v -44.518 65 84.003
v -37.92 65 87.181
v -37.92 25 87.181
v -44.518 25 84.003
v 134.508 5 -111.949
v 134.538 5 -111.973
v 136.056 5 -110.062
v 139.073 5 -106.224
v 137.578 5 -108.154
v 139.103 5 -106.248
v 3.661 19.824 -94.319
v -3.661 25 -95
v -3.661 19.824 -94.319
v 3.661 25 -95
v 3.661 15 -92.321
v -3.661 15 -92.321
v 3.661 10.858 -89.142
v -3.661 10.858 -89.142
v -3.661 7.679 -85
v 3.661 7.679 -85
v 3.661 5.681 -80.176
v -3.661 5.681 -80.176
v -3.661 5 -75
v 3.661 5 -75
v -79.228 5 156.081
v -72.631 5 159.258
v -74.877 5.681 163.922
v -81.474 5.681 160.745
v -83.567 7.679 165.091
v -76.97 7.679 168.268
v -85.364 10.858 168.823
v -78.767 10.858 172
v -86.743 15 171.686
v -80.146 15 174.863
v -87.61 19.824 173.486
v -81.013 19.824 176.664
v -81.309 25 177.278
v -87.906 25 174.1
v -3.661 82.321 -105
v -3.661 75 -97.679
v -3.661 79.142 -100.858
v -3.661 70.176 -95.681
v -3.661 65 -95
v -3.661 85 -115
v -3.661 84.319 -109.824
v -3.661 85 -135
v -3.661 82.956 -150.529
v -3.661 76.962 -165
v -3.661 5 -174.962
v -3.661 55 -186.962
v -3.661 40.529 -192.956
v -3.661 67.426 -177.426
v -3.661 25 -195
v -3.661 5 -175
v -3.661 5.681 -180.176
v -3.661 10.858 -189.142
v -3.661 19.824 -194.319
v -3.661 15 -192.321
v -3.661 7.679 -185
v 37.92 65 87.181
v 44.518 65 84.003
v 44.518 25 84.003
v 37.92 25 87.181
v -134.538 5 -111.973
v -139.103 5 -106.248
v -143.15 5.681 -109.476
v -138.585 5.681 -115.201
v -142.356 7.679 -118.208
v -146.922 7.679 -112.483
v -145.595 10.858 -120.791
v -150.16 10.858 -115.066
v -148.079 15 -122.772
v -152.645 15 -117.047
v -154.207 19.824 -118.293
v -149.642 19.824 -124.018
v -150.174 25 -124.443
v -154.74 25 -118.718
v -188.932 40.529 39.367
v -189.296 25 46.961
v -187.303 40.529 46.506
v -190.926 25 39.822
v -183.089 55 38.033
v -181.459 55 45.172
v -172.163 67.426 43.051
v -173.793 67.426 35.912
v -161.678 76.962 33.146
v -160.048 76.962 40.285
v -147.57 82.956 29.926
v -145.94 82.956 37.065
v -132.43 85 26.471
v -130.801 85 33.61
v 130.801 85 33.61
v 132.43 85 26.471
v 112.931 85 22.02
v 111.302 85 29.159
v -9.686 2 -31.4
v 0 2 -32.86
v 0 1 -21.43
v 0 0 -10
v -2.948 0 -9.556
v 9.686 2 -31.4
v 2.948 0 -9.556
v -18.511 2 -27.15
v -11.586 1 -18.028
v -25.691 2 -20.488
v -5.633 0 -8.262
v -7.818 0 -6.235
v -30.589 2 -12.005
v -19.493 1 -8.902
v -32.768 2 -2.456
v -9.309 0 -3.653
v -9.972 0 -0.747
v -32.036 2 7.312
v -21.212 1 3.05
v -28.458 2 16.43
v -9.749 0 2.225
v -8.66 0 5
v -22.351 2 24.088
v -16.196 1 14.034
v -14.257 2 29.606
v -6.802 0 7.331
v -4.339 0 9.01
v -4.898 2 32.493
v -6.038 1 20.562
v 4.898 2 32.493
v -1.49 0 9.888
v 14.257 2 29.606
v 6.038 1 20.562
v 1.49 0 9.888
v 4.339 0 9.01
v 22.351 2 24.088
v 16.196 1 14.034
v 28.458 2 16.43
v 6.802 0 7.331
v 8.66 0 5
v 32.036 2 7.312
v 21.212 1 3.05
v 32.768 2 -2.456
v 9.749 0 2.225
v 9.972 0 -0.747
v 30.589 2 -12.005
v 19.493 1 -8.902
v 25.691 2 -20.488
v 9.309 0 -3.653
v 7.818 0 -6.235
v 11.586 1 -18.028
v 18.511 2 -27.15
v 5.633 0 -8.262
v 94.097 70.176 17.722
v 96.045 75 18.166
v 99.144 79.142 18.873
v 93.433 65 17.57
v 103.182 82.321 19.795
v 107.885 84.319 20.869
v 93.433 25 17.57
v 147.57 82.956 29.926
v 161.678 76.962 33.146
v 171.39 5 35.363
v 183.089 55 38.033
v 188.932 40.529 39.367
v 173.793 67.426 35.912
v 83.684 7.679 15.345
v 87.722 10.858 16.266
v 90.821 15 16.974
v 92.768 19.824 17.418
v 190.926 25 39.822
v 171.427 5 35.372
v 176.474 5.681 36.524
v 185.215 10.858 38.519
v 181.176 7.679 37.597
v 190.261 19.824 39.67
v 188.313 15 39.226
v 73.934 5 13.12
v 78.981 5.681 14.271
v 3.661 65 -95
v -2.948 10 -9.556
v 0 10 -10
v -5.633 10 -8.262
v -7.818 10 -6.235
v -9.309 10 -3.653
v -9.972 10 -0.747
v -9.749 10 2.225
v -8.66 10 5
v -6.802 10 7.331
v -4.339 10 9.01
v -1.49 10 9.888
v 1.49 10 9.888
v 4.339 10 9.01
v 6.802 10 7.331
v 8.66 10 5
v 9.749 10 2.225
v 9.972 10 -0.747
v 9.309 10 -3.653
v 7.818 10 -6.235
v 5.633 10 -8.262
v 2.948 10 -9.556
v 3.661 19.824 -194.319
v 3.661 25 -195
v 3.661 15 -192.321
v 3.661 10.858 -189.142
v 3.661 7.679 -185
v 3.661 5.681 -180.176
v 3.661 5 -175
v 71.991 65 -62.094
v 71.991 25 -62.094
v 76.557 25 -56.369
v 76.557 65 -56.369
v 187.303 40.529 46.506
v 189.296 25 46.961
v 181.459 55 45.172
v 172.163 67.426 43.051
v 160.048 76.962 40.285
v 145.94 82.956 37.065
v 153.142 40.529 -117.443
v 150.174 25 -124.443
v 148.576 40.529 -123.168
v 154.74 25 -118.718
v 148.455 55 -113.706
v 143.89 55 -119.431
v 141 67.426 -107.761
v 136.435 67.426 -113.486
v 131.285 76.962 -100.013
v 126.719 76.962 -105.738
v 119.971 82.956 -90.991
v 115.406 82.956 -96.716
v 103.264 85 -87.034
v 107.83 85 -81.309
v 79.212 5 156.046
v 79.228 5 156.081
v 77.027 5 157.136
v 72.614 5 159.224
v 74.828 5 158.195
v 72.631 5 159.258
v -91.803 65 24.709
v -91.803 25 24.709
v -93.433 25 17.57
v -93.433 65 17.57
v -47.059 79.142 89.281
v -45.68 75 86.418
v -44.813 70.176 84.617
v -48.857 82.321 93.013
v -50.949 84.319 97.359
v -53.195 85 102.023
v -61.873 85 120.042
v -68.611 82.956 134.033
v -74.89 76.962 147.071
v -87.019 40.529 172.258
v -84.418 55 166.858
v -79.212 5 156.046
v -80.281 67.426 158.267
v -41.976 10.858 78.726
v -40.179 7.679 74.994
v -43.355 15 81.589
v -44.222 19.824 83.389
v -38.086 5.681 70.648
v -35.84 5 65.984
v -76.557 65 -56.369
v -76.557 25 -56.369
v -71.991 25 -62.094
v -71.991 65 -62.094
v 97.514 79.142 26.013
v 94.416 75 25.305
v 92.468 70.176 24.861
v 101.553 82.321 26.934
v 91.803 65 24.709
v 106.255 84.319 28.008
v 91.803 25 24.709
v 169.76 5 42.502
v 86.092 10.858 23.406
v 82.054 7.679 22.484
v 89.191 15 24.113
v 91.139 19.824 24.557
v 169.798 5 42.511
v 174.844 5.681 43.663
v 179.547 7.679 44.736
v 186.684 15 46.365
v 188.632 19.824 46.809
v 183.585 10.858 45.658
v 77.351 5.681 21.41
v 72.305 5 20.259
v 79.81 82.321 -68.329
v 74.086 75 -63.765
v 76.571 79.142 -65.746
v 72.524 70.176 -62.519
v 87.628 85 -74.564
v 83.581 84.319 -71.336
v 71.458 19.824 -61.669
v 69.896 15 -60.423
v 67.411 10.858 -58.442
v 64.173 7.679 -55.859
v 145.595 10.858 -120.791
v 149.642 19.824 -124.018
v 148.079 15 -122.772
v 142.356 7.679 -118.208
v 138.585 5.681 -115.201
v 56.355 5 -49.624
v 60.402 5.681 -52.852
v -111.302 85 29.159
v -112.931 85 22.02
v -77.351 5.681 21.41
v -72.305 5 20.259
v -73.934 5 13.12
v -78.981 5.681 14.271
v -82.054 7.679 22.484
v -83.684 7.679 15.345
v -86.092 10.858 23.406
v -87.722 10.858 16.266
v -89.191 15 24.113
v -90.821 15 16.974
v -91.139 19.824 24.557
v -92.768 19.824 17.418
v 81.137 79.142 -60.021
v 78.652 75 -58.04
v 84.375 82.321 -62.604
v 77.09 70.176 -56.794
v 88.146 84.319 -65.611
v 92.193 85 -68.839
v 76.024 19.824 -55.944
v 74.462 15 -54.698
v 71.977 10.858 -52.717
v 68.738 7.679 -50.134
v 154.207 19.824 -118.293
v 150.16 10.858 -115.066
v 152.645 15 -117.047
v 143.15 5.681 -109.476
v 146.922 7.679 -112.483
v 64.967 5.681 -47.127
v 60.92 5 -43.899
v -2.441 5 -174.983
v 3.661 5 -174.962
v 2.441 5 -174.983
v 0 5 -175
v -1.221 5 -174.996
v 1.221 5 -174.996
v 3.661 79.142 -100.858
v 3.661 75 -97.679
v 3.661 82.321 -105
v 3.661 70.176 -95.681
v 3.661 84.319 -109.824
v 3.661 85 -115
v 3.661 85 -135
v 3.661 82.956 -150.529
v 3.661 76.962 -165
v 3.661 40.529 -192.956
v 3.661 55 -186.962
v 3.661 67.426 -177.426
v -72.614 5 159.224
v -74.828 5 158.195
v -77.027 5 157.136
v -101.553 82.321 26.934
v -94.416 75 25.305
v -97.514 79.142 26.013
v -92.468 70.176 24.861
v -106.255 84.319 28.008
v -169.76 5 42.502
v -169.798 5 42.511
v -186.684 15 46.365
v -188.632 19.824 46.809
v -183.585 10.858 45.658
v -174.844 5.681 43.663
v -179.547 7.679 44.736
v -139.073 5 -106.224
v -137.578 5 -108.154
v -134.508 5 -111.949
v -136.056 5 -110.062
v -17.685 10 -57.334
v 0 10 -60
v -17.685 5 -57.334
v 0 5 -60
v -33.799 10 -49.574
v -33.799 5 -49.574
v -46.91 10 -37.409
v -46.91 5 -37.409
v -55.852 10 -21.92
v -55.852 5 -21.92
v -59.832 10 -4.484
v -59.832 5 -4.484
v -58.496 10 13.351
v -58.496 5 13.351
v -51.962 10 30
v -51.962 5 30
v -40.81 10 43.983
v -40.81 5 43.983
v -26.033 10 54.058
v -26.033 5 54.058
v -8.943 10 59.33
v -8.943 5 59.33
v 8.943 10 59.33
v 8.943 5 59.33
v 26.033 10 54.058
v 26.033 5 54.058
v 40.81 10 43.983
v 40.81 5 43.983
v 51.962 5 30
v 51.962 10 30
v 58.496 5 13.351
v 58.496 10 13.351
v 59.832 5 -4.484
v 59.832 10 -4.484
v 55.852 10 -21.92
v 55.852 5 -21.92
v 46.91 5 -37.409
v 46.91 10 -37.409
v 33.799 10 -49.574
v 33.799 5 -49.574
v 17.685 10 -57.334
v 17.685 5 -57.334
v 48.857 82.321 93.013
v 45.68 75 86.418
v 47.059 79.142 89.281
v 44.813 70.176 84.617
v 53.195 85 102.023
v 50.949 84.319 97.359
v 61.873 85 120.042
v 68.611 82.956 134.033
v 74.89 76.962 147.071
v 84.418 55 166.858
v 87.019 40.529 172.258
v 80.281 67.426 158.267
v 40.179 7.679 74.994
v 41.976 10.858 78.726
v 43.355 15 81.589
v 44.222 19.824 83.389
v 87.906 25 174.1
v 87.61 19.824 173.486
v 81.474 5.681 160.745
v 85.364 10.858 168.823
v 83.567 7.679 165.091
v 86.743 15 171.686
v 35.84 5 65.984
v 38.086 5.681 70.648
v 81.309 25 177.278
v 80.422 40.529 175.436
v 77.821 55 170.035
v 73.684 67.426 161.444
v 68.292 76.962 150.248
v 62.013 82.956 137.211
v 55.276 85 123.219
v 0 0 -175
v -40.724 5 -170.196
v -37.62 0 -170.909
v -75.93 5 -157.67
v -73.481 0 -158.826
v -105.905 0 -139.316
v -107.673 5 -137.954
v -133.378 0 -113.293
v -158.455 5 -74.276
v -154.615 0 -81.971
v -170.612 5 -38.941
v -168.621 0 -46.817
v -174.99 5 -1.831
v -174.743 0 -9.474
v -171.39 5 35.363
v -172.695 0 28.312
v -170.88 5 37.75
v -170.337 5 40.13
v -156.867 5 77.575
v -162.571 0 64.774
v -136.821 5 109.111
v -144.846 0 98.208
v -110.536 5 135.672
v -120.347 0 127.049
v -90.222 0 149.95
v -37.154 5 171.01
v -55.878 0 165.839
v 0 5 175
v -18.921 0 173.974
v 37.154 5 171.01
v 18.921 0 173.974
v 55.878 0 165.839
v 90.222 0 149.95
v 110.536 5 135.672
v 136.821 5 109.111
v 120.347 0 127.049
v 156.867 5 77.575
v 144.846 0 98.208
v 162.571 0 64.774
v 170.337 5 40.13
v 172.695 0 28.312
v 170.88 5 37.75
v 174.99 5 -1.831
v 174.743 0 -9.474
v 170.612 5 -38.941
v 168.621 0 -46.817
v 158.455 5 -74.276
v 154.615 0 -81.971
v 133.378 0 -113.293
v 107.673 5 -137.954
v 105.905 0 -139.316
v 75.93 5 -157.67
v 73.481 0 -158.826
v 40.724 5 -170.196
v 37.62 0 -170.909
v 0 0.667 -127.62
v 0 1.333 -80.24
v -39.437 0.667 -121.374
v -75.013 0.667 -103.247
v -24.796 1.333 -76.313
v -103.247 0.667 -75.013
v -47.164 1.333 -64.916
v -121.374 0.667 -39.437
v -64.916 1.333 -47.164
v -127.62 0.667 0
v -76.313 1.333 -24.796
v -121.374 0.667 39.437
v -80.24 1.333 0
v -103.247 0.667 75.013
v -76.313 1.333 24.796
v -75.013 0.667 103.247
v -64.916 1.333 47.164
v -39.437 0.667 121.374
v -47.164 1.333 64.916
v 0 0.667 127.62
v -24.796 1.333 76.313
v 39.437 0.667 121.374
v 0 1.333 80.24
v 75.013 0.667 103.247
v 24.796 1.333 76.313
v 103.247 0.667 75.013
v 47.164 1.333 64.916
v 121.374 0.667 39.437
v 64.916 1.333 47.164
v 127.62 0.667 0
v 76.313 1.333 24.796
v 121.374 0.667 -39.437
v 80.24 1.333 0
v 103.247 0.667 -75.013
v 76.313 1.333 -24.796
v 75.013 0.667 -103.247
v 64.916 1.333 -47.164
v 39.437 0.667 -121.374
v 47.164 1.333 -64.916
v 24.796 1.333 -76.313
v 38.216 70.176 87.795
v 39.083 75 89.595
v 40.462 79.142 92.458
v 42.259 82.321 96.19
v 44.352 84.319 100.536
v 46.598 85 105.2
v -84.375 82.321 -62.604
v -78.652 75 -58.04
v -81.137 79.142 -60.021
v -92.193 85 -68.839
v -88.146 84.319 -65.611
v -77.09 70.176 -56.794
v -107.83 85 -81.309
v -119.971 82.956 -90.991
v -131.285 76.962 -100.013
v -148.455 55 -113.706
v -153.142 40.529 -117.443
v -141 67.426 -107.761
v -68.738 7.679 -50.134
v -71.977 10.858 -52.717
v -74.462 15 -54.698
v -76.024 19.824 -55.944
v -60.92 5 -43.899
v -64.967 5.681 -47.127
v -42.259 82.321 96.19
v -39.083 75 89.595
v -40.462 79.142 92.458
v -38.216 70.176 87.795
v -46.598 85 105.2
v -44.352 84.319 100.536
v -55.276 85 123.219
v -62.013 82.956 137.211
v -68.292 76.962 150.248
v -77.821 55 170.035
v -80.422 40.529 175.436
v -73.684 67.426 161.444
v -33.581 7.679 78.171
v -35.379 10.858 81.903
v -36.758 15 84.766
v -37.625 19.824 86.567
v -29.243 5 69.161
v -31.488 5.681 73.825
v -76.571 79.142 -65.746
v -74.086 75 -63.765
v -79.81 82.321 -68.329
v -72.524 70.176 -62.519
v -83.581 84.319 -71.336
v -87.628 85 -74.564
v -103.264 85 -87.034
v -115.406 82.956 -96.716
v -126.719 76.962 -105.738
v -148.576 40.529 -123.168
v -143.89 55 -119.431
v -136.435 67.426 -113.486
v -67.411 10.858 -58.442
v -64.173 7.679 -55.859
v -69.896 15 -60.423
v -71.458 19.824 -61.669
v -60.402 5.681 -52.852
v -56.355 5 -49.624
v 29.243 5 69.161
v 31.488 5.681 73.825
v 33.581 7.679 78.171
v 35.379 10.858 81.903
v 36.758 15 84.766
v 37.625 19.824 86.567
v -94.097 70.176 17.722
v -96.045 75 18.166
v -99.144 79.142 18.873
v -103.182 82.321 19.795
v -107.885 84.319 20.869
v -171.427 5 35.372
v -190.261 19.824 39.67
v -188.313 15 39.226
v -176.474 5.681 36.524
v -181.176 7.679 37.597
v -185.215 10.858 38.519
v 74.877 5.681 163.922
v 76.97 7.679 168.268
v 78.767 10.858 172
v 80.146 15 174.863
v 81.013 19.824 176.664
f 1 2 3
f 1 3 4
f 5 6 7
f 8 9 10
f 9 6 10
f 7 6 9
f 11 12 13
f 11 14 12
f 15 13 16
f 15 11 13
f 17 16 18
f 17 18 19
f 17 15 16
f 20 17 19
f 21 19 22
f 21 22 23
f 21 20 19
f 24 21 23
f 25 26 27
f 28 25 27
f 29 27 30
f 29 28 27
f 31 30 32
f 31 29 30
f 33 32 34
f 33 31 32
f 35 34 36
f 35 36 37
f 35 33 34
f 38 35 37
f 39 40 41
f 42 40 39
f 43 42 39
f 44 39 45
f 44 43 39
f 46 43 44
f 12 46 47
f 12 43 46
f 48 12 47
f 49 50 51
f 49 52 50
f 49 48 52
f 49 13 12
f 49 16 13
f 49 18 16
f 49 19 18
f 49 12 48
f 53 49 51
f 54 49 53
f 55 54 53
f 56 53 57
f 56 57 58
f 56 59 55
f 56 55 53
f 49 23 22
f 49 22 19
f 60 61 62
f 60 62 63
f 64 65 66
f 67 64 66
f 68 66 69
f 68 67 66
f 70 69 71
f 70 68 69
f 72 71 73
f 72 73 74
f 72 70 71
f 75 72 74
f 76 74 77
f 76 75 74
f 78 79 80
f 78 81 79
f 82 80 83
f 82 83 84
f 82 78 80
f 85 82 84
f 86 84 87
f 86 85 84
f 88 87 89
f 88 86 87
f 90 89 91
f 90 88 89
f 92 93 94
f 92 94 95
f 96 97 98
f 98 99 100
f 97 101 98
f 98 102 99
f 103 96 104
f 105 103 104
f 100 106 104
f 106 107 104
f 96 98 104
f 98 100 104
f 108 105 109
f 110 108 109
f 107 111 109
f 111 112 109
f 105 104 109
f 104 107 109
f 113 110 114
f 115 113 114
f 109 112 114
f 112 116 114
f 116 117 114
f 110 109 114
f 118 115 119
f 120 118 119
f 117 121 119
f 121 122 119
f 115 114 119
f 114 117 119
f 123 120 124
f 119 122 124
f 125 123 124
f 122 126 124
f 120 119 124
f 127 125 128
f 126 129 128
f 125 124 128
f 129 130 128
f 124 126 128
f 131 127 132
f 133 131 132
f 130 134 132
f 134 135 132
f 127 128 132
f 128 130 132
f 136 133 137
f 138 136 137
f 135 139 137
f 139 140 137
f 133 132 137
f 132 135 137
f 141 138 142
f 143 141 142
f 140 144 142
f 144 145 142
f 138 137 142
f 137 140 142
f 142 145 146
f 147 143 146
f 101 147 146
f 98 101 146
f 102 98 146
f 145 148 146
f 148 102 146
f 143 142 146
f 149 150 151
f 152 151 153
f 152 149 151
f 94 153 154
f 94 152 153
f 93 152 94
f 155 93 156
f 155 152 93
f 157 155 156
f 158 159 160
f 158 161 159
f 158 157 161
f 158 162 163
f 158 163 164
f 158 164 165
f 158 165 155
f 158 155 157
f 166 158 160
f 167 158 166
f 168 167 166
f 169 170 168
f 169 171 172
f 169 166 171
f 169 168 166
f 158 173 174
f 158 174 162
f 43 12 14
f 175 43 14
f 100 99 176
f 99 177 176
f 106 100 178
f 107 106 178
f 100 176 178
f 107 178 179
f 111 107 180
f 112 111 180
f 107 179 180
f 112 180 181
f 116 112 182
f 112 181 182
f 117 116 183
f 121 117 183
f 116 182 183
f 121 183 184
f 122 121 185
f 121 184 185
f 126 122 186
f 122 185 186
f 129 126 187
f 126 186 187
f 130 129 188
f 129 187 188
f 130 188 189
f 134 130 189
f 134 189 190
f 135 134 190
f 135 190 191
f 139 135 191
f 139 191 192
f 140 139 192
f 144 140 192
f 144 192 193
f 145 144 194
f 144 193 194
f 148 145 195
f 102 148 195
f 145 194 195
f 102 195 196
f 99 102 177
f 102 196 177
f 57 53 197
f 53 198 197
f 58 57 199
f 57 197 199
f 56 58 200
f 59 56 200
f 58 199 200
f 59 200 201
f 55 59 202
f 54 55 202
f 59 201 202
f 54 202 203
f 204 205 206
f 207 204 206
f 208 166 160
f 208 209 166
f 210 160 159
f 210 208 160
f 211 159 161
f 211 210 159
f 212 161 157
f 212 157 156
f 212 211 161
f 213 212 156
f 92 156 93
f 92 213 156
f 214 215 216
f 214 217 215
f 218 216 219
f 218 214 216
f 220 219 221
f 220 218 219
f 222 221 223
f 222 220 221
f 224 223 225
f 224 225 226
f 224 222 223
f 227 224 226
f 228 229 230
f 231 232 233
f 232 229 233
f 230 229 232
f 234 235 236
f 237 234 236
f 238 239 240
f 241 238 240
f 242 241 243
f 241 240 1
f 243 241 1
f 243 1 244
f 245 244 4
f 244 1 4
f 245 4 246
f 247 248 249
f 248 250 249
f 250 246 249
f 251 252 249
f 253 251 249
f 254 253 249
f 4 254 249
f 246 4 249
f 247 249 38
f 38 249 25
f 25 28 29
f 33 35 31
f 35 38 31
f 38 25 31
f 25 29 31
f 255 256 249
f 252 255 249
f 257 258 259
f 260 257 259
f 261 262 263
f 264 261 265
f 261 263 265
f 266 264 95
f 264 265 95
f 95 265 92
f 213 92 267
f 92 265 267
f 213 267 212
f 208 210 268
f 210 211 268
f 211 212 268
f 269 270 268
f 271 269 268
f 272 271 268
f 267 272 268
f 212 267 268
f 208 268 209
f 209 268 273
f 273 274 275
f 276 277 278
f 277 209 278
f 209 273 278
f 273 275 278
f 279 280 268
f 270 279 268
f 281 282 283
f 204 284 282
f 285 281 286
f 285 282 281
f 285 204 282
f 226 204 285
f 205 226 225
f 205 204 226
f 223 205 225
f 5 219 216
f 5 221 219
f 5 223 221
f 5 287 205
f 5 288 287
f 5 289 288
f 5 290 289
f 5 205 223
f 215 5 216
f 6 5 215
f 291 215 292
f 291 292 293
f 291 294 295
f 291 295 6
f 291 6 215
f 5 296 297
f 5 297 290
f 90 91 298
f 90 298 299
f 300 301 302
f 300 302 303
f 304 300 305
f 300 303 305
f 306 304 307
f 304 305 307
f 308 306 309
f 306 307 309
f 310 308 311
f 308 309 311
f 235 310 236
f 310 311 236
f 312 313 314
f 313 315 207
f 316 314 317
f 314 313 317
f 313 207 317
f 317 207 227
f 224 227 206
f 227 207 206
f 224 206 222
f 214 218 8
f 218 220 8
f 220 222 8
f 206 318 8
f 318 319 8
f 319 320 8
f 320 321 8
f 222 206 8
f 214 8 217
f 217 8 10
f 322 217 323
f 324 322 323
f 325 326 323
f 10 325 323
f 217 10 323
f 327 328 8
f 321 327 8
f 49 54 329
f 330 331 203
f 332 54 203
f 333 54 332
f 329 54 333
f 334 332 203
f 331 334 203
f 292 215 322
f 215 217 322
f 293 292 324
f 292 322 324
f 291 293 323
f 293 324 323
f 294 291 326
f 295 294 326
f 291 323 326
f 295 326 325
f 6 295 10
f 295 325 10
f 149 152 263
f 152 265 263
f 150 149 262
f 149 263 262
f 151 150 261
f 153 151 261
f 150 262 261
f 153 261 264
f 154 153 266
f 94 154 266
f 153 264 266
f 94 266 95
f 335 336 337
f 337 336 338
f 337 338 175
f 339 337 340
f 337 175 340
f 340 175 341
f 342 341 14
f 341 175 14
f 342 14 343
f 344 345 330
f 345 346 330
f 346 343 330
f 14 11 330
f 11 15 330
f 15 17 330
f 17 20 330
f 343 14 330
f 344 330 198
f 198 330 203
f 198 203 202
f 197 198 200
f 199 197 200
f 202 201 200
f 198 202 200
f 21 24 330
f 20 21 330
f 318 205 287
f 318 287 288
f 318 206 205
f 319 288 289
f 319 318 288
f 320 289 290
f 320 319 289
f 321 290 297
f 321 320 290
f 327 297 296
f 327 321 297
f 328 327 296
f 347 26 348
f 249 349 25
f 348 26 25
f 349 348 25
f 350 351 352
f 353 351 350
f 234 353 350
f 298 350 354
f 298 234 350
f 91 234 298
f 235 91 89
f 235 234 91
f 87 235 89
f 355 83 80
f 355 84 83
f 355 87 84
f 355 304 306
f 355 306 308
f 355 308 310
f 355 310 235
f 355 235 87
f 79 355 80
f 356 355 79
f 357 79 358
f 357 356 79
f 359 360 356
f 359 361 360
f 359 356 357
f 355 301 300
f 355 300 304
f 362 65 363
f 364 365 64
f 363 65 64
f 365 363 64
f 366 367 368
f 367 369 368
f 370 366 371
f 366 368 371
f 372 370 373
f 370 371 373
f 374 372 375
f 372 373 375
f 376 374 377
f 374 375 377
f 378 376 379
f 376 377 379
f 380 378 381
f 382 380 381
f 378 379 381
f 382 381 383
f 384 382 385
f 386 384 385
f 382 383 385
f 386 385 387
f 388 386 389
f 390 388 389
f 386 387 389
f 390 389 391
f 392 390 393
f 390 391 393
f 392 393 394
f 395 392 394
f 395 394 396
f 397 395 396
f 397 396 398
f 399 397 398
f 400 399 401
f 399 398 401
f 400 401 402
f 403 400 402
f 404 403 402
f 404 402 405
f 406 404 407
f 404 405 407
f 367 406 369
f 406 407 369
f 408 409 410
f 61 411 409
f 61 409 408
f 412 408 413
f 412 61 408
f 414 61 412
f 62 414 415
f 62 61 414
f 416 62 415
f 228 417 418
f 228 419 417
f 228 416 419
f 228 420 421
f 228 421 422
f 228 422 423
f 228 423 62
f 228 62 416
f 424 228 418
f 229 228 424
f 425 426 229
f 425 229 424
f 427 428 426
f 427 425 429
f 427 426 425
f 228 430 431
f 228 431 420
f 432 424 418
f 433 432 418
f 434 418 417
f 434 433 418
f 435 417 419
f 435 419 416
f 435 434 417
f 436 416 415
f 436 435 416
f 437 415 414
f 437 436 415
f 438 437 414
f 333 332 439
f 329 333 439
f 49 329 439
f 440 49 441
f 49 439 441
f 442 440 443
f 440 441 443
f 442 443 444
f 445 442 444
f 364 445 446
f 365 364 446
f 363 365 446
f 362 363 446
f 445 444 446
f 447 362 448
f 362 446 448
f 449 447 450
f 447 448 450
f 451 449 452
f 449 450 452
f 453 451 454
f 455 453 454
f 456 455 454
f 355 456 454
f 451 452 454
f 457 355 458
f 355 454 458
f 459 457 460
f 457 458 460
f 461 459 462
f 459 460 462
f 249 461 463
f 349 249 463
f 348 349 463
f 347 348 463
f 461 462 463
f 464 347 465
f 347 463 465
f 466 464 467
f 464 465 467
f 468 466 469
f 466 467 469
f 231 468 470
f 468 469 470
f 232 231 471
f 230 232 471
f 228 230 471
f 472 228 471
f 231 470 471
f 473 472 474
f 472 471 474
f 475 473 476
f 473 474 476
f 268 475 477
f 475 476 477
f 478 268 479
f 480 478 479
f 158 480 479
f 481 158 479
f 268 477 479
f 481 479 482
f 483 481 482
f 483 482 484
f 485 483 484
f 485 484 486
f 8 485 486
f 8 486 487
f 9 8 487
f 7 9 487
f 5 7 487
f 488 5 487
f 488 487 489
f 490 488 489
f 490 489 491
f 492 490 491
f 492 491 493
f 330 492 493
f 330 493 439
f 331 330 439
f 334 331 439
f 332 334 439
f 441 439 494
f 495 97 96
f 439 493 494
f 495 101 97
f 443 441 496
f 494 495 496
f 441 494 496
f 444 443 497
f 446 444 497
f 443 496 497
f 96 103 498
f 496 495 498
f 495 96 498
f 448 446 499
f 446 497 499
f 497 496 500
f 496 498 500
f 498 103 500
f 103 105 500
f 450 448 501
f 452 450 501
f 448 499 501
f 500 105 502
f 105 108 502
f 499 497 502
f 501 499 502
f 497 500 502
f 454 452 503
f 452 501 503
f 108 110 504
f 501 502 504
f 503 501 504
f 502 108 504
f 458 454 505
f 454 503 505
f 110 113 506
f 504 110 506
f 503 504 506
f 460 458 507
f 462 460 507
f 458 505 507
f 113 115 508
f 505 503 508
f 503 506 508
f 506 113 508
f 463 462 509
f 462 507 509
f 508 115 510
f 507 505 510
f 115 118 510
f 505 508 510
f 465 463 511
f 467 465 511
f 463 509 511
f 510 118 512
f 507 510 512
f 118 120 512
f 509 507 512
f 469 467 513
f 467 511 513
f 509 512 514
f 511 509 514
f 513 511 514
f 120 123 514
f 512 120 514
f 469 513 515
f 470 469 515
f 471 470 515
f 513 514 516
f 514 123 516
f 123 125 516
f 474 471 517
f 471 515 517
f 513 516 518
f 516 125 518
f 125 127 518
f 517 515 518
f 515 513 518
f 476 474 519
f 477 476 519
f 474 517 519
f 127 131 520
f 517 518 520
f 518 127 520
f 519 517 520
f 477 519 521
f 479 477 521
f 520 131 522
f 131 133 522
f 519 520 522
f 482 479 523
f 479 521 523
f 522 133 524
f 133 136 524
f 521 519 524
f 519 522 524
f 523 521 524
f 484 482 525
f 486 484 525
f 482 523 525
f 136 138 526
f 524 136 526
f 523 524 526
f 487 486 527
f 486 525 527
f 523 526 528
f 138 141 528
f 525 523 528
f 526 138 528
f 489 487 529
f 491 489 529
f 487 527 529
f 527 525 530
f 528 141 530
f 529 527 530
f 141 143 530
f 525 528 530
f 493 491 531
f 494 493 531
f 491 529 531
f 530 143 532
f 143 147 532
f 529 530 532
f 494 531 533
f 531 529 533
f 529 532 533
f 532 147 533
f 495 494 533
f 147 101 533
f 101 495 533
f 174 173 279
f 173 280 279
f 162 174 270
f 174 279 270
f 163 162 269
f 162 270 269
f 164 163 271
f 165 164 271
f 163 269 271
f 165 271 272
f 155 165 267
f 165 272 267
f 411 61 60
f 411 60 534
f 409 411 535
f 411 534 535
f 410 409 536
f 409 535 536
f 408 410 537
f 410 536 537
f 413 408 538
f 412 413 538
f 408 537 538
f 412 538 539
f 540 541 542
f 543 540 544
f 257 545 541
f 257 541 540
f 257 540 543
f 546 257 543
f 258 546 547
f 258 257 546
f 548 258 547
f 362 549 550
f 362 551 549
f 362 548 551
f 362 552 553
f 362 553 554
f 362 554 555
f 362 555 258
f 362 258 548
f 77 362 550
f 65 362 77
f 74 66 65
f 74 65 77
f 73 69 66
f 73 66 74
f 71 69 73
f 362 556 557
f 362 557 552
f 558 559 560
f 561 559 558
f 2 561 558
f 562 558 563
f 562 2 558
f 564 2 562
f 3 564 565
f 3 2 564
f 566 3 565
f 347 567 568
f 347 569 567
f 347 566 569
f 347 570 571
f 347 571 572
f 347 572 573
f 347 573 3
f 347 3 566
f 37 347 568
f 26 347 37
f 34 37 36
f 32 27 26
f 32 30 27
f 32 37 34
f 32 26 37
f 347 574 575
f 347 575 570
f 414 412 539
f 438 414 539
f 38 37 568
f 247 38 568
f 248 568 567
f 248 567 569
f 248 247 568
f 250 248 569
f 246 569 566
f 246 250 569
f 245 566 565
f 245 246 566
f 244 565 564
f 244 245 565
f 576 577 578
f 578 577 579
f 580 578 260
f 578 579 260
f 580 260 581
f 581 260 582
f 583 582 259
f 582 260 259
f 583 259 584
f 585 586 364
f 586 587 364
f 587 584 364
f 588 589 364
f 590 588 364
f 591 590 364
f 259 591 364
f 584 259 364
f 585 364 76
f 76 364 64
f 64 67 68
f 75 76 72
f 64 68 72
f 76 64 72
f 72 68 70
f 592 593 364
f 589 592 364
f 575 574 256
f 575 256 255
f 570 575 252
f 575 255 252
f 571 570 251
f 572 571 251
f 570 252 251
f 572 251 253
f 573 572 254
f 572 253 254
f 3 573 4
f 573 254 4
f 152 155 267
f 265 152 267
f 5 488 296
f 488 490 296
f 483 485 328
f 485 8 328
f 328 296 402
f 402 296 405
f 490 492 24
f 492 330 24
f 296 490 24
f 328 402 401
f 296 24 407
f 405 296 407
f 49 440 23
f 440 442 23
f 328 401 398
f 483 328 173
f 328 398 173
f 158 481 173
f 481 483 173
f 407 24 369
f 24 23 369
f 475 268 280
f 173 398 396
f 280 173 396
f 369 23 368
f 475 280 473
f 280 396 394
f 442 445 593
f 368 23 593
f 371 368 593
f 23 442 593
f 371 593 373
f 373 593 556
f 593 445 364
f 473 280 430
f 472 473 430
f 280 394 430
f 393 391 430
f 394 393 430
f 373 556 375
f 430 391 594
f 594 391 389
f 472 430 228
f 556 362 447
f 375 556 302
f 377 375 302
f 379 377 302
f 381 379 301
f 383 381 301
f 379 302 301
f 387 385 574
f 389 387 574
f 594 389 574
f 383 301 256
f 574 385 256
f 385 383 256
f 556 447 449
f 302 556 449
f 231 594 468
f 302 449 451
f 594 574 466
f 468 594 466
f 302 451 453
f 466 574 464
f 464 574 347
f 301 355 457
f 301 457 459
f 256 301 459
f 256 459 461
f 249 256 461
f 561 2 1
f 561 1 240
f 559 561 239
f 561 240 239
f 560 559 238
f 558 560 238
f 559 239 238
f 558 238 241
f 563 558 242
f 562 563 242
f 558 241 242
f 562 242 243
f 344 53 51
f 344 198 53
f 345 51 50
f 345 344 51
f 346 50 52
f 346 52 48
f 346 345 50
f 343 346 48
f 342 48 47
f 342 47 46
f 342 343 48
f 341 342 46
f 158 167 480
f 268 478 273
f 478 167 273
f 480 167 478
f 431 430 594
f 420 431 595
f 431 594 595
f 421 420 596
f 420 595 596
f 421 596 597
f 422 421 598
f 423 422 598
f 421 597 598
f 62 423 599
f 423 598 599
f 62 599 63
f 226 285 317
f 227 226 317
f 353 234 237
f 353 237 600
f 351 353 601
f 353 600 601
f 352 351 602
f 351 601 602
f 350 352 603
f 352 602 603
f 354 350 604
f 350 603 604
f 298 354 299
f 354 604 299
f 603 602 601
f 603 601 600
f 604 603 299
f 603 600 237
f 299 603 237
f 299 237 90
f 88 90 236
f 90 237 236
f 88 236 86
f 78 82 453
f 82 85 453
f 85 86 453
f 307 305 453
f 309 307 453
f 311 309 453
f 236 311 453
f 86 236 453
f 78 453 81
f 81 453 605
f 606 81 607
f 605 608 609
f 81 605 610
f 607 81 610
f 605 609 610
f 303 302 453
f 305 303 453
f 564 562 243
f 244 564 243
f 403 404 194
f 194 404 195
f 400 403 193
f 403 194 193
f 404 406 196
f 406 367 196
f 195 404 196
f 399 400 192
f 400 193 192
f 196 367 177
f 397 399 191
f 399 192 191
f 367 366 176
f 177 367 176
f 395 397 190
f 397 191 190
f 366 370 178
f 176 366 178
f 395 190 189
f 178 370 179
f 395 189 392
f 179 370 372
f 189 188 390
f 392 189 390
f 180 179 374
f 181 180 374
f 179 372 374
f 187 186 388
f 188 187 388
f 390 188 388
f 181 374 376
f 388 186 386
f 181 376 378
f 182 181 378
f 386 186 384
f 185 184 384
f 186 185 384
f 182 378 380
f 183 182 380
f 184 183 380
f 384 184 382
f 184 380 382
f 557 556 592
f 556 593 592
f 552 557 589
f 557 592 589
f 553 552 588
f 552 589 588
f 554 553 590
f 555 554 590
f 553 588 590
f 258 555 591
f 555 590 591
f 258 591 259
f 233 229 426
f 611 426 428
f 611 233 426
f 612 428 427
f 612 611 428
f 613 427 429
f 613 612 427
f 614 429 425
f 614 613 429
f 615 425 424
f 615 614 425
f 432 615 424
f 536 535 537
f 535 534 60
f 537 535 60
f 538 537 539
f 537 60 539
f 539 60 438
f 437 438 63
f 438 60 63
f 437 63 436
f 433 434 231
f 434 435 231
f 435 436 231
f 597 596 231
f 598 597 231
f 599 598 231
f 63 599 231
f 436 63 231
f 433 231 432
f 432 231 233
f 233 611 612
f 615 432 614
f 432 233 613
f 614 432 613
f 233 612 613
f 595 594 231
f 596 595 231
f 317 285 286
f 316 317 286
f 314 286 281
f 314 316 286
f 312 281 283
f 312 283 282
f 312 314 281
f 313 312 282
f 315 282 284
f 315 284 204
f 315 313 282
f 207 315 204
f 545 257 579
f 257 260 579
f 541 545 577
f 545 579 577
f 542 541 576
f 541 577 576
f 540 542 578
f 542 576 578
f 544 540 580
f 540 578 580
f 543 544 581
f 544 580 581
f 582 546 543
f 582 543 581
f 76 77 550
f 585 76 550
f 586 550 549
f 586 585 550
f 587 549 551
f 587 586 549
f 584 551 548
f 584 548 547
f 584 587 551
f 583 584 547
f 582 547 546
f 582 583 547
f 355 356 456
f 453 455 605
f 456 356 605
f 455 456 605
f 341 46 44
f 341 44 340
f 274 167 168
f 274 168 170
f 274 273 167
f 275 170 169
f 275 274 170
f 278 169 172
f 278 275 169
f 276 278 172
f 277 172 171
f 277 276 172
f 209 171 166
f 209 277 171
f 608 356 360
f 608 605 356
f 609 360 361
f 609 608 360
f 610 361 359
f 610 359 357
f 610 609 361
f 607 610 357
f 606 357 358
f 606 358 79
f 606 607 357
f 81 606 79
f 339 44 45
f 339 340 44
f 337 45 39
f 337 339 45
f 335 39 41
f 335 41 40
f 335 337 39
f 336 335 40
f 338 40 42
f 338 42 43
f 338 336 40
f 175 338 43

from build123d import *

# Parameters (mm, degrees)
SKETCH3_W                = 7.322640784
SKETCH3_H                = 100
BOSS_EXTRUDE1_DEPTH      = 80
FILLET1_R                = 60
FILLET2_R                = 20
FILLET3_R                = 20
FILLET4_R                = 20
CIRPATTERN2_COUNT        = 7
FILLET1_OF_CIRPATTERN2_R = 60
FILLET2_OF_CIRPATTERN2_R = 20
FILLET3_OF_CIRPATTERN2_R = 20
FILLET4_OF_CIRPATTERN2_R = 20


with BuildPart() as part:
    # Sketch2 → Revolve2 (revolve)
    with BuildSketch(Plane(origin=(0, 0, 0), x_dir=(0, 0, -1), z_dir=(1, 0, 0))):
        Polygon((32.860104606, 2), (10, 0), (10, 10), (60, 10), (60, 5), (175, 5), (175, 0), align=None)
    revolve(axis=Axis((0, 0, 0), (0, 1, 0)))

    # Sketch3 → Boss-Extrude1 (add)
    with BuildSketch(Plane(origin=(0, 5, 0), x_dir=(1, 0, 0), z_dir=(0, 1, 0))):
        with Locations((0, 145)):
            Rectangle(SKETCH3_W, SKETCH3_H)
    boss_extrude1 = extrude(amount=BOSS_EXTRUDE1_DEPTH)

    # Fillet1
    fillet1_edges = [part.edges().sort_by_distance(p)[0] for p in [
        (0, 85, -195),
    ]]
    fillet(fillet1_edges, radius=FILLET1_R)

    # Fillet2
    fillet2_edges = [part.edges().sort_by_distance(p)[0] for p in [
        (0, 5, -195),
    ]]
    fillet(fillet2_edges, radius=FILLET2_R - 0.0001)  # a hair under: the kernel refuses the full size

    # Fillet3
    fillet3_edges = [part.edges().sort_by_distance(p)[0] for p in [
        (0, 85, -95),
    ]]
    fillet(fillet3_edges, radius=FILLET3_R)

    # Fillet4
    fillet4_edges = [part.edges().sort_by_distance(p)[0] for p in [
        (0, 5, -95),
    ]]
    fillet(fillet4_edges, radius=FILLET4_R)

    # CirPattern2: Boss-Extrude1 ×7 about axis
    cirpattern2_axis = Axis((0, 0, 0), (0, 1, 0))
    for i in range(1, CIRPATTERN2_COUNT):
        add(boss_extrude1.rotate(cirpattern2_axis, i * 360 / CIRPATTERN2_COUNT))

    # Fillet1 of CirPattern2
    fillet1_of_cirpattern2_edges = [part.edges().sort_by_distance(p)[0] for p in [
        (-152.457139081, 85, -121.580511362),
        (-190.110942875, 85, 43.391582121),
        (-84.607329128, 85, 175.688929241),
        (84.607329128, 85, 175.688929241),
        (190.110942875, 85, 43.391582121),
        (152.457139081, 85, -121.580511362),
    ]]
    fillet(fillet1_of_cirpattern2_edges, radius=FILLET1_OF_CIRPATTERN2_R)

    # Fillet2 of CirPattern2
    fillet2_of_cirpattern2_edges = [part.edges().sort_by_distance(p)[0] for p in [
        (-152.457139081, 5, -121.580511362),
        (-190.110942875, 5, 43.391582121),
        (-84.607329128, 5, 175.688929241),
        (84.607329128, 5, 175.688929241),
        (190.110942875, 5, 43.391582121),
        (152.457139081, 5, -121.580511362),
    ]]
    fillet(fillet2_of_cirpattern2_edges, radius=FILLET2_OF_CIRPATTERN2_R - 0.0001)  # a hair under: the kernel refuses the full size

    # Fillet3 of CirPattern2
    fillet3_of_cirpattern2_edges = [part.edges().sort_by_distance(p)[0] for p in [
        (-74.273990834, 85, -59.231531177),
        (-92.618151657, 85, 21.139488726),
        (-41.218955216, 85, 85.592042451),
        (41.218955216, 85, 85.592042451),
        (92.618151657, 85, 21.139488726),
        (74.273990834, 85, -59.231531177),
    ]]
    fillet(fillet3_of_cirpattern2_edges, radius=FILLET3_OF_CIRPATTERN2_R)

    # Fillet4 of CirPattern2
    fillet4_of_cirpattern2_edges = [part.edges().sort_by_distance(p)[0] for p in [
        (-74.273990834, 5, -59.231531177),
        (-92.618151657, 5, 21.139488726),
        (-41.218955216, 5, 85.592042451),
        (41.218955216, 5, 85.592042451),
        (92.618151657, 5, 21.139488726),
        (74.273990834, 5, -59.231531177),
    ]]
    fillet(fillet4_of_cirpattern2_edges, radius=FILLET4_OF_CIRPATTERN2_R)


solid = part.part
